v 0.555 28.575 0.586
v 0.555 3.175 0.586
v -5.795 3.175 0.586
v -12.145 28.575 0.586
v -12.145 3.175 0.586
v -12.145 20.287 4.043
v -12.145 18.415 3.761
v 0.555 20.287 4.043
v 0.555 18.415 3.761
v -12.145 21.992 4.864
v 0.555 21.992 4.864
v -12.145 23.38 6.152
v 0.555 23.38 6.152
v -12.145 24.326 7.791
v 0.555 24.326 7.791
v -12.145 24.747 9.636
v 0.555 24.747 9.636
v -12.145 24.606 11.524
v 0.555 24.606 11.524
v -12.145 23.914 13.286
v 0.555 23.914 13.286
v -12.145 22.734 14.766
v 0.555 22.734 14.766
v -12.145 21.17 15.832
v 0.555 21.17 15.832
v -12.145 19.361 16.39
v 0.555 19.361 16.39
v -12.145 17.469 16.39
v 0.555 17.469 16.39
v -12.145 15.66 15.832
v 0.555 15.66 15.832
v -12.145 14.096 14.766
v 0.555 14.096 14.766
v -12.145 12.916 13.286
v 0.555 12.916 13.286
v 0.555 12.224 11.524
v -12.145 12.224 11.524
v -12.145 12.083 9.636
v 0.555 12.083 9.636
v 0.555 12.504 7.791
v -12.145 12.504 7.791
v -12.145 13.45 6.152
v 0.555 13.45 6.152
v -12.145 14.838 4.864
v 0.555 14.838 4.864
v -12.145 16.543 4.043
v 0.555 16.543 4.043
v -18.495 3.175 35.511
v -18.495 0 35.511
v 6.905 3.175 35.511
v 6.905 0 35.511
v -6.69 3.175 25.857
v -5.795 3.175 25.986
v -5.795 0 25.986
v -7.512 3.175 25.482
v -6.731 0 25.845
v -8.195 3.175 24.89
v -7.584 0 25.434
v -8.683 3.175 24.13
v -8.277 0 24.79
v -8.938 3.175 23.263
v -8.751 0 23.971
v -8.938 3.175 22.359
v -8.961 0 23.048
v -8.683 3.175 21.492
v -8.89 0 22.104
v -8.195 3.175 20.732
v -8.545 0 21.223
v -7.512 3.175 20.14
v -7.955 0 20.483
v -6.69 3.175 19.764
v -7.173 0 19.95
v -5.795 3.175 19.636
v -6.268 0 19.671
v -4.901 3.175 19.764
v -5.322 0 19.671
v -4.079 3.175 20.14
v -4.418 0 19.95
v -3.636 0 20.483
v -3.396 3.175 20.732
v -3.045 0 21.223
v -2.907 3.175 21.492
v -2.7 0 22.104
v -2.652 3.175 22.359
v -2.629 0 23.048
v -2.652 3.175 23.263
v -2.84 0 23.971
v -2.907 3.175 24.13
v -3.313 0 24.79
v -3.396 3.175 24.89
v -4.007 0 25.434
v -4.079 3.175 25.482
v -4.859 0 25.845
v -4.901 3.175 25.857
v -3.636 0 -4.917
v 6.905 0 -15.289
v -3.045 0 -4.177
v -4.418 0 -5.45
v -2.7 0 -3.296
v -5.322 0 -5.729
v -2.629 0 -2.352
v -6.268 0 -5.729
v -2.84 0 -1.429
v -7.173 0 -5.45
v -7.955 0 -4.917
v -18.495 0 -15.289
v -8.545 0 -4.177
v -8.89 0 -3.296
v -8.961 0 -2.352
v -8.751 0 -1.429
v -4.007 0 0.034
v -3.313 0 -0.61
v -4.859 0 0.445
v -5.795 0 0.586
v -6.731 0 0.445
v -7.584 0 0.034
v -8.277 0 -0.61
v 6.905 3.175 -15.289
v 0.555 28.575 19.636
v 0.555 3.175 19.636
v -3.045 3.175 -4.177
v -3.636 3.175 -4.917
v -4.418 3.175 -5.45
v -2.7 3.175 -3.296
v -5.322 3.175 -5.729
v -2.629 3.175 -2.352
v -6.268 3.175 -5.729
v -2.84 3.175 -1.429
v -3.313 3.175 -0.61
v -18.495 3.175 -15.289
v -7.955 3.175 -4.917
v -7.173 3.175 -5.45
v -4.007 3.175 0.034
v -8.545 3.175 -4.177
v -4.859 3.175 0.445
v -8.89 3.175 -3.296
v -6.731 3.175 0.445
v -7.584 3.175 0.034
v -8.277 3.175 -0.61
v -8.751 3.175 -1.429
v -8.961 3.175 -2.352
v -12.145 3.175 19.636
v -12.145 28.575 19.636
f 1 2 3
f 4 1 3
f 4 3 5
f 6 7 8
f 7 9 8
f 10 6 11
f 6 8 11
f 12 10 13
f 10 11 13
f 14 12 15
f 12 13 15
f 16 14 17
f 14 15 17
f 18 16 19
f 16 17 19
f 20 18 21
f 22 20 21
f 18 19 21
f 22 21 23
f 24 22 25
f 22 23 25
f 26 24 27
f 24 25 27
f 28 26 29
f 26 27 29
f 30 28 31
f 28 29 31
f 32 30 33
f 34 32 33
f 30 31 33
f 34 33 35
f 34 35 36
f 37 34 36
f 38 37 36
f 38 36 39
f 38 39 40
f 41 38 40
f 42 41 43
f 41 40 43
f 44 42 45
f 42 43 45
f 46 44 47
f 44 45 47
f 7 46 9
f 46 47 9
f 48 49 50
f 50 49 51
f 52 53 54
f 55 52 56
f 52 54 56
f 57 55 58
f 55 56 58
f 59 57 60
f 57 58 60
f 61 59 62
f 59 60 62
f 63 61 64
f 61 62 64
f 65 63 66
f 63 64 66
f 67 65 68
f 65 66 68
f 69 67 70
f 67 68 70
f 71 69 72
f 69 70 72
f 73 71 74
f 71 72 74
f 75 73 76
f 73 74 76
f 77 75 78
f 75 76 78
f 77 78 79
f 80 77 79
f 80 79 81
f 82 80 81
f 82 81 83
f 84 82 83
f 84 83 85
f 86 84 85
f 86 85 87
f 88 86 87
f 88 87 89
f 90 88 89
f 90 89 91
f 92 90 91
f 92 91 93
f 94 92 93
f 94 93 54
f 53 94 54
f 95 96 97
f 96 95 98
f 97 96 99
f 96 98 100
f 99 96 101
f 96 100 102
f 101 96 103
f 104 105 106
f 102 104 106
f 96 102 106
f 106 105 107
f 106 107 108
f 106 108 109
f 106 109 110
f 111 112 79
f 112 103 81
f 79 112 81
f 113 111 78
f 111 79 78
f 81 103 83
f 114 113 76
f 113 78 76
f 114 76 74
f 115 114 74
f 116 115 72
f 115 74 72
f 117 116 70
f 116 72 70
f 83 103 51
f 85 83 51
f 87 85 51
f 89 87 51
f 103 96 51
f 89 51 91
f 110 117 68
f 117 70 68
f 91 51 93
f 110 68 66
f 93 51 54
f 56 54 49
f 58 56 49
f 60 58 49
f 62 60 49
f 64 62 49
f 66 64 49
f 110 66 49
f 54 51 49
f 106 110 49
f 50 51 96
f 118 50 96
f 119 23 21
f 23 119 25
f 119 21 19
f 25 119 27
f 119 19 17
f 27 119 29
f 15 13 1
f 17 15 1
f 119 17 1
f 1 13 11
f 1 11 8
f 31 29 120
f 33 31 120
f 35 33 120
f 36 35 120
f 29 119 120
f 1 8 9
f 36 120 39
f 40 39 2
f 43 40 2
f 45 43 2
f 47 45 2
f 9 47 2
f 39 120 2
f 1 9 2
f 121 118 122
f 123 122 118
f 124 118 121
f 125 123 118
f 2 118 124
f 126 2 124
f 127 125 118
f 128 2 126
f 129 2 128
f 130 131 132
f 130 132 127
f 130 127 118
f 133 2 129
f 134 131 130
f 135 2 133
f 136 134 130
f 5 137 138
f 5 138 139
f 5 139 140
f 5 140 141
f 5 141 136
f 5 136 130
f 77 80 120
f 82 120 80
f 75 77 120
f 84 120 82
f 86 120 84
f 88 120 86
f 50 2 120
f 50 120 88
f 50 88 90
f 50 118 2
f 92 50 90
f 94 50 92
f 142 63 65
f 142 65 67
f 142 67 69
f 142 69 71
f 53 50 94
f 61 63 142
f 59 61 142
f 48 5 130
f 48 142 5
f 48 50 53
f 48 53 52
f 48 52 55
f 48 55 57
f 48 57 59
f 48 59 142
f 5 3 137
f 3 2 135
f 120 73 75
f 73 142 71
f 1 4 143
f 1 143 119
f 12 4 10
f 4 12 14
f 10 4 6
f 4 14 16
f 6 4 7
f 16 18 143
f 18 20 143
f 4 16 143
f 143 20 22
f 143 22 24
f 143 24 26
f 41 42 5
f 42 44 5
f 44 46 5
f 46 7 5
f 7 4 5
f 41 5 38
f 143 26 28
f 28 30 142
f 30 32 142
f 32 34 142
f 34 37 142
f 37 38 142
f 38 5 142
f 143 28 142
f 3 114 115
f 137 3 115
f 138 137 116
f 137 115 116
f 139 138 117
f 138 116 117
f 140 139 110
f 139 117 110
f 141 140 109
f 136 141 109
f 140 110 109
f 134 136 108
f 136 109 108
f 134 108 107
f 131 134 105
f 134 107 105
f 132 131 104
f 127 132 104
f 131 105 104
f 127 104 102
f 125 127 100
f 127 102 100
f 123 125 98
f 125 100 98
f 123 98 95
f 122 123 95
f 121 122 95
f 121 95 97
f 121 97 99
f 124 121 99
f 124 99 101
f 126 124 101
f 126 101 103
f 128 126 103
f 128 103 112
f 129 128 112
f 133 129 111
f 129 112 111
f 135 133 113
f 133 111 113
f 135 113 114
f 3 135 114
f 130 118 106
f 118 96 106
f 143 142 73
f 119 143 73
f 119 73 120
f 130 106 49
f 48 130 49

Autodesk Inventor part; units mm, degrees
ref_plane "YZ Plane" through (0, 0, 0) normal (1, 0, 0) x (0, 1, 0)
ref_plane "XZ Plane" through (0, 0, 0) normal (0, 1, 0) x (-1, 0, 0)
ref_plane "XY Plane" through (0, 0, 0) normal (0, 0, 1) x (1, 0, 0)
sketch "Sketch1" plane through (0, 0, 0) normal (0, 1, 0) x (-1, 0, 0)
  line L0 (18.4951, 35.5107) -> (-6.9049, 35.5107)
  line L1 (-6.9049, 35.5107) -> (-6.9049, -15.2893)
  line L2 (-6.9049, -15.2893) -> (18.4951, -15.2893)
  line L3 (18.4951, -15.2893) -> (18.4951, 35.5107)
  point P0 (0, 0)
  dimension "d0" = 50.8
  dimension "d1" = 25.4
extrude "Extrusion1" add sketch "Sketch1" along normal blind 3.175
sketch "Sketch2" plane through (0, 3.175, 0) normal (0, 1, 0) x (1, 0, 0)
  line L0 (-18.4951, 15.2893) -> (-18.4951, -35.5107) projected
  line L1 (6.9049, 15.2893) -> (-18.4951, 15.2893) projected
  point P0 (0, 0)
  point P1 (-5.7951, -22.8107)
  point P2 (-5.7951, 2.5893)
  dimension "d4" = 12.7
  dimension "d5" = 12.7
  dimension "d6" = 25.4
  dimension "d7" = 12.7
hole "Hole1" at (-5.7951, 3.175, 22.8107) at (-5.7951, 3.175, -2.5893) direction (0, -1, 0) diameter 6.35 end through all
sketch "Sketch3" plane through (0, 3.175, 0) normal (0, 1, 0) x (1, 0, 0)
  line L0 (-12.1451, -19.6357) -> (0.5549, -19.6357)
  line L1 (0.5549, -19.6357) -> (0.5549, -0.5857)
  line L2 (0.5549, -0.5857) -> (-12.1451, -0.5857)
  line L3 (-12.1451, -0.5857) -> (-12.1451, -19.6357)
  line L4 (-18.4951, 15.2893) -> (-18.4951, -35.5107) projected
  line L5 (6.9049, 15.2893) -> (-18.4951, 15.2893) projected
  line L6 (-18.4951, -35.5107) -> (6.9049, -35.5107) projected
  point P0 (0, 0)
  dimension "d15" = 12.7
  dimension "d16" = 6.35
  dimension "d17" = 15.875
  dimension "d18" = 15.875
extrude "Extrusion2" add sketch "Sketch3" along normal blind 25.4
sketch "Sketch4" plane through (0.5549, 3.175, 19.6357) normal (1, 0, 0) x (0, 0, -1)
  circle A0 centre (9.525, 15.24) radius 6.35
  line L0 (19.05, 0) -> (19.05, 25.4) projected
  line L1 (0, 25.4) -> (19.05, 25.4) projected
  point P0 (19.6357, -3.175)
  dimension "d21" = 9.525
  dimension "d22" = 12.7
  dimension "d23" = 10.16
extrude "Extrusion3" cut sketch "Sketch4" against normal blind 25.4
properties part number "Main Axle notch"
